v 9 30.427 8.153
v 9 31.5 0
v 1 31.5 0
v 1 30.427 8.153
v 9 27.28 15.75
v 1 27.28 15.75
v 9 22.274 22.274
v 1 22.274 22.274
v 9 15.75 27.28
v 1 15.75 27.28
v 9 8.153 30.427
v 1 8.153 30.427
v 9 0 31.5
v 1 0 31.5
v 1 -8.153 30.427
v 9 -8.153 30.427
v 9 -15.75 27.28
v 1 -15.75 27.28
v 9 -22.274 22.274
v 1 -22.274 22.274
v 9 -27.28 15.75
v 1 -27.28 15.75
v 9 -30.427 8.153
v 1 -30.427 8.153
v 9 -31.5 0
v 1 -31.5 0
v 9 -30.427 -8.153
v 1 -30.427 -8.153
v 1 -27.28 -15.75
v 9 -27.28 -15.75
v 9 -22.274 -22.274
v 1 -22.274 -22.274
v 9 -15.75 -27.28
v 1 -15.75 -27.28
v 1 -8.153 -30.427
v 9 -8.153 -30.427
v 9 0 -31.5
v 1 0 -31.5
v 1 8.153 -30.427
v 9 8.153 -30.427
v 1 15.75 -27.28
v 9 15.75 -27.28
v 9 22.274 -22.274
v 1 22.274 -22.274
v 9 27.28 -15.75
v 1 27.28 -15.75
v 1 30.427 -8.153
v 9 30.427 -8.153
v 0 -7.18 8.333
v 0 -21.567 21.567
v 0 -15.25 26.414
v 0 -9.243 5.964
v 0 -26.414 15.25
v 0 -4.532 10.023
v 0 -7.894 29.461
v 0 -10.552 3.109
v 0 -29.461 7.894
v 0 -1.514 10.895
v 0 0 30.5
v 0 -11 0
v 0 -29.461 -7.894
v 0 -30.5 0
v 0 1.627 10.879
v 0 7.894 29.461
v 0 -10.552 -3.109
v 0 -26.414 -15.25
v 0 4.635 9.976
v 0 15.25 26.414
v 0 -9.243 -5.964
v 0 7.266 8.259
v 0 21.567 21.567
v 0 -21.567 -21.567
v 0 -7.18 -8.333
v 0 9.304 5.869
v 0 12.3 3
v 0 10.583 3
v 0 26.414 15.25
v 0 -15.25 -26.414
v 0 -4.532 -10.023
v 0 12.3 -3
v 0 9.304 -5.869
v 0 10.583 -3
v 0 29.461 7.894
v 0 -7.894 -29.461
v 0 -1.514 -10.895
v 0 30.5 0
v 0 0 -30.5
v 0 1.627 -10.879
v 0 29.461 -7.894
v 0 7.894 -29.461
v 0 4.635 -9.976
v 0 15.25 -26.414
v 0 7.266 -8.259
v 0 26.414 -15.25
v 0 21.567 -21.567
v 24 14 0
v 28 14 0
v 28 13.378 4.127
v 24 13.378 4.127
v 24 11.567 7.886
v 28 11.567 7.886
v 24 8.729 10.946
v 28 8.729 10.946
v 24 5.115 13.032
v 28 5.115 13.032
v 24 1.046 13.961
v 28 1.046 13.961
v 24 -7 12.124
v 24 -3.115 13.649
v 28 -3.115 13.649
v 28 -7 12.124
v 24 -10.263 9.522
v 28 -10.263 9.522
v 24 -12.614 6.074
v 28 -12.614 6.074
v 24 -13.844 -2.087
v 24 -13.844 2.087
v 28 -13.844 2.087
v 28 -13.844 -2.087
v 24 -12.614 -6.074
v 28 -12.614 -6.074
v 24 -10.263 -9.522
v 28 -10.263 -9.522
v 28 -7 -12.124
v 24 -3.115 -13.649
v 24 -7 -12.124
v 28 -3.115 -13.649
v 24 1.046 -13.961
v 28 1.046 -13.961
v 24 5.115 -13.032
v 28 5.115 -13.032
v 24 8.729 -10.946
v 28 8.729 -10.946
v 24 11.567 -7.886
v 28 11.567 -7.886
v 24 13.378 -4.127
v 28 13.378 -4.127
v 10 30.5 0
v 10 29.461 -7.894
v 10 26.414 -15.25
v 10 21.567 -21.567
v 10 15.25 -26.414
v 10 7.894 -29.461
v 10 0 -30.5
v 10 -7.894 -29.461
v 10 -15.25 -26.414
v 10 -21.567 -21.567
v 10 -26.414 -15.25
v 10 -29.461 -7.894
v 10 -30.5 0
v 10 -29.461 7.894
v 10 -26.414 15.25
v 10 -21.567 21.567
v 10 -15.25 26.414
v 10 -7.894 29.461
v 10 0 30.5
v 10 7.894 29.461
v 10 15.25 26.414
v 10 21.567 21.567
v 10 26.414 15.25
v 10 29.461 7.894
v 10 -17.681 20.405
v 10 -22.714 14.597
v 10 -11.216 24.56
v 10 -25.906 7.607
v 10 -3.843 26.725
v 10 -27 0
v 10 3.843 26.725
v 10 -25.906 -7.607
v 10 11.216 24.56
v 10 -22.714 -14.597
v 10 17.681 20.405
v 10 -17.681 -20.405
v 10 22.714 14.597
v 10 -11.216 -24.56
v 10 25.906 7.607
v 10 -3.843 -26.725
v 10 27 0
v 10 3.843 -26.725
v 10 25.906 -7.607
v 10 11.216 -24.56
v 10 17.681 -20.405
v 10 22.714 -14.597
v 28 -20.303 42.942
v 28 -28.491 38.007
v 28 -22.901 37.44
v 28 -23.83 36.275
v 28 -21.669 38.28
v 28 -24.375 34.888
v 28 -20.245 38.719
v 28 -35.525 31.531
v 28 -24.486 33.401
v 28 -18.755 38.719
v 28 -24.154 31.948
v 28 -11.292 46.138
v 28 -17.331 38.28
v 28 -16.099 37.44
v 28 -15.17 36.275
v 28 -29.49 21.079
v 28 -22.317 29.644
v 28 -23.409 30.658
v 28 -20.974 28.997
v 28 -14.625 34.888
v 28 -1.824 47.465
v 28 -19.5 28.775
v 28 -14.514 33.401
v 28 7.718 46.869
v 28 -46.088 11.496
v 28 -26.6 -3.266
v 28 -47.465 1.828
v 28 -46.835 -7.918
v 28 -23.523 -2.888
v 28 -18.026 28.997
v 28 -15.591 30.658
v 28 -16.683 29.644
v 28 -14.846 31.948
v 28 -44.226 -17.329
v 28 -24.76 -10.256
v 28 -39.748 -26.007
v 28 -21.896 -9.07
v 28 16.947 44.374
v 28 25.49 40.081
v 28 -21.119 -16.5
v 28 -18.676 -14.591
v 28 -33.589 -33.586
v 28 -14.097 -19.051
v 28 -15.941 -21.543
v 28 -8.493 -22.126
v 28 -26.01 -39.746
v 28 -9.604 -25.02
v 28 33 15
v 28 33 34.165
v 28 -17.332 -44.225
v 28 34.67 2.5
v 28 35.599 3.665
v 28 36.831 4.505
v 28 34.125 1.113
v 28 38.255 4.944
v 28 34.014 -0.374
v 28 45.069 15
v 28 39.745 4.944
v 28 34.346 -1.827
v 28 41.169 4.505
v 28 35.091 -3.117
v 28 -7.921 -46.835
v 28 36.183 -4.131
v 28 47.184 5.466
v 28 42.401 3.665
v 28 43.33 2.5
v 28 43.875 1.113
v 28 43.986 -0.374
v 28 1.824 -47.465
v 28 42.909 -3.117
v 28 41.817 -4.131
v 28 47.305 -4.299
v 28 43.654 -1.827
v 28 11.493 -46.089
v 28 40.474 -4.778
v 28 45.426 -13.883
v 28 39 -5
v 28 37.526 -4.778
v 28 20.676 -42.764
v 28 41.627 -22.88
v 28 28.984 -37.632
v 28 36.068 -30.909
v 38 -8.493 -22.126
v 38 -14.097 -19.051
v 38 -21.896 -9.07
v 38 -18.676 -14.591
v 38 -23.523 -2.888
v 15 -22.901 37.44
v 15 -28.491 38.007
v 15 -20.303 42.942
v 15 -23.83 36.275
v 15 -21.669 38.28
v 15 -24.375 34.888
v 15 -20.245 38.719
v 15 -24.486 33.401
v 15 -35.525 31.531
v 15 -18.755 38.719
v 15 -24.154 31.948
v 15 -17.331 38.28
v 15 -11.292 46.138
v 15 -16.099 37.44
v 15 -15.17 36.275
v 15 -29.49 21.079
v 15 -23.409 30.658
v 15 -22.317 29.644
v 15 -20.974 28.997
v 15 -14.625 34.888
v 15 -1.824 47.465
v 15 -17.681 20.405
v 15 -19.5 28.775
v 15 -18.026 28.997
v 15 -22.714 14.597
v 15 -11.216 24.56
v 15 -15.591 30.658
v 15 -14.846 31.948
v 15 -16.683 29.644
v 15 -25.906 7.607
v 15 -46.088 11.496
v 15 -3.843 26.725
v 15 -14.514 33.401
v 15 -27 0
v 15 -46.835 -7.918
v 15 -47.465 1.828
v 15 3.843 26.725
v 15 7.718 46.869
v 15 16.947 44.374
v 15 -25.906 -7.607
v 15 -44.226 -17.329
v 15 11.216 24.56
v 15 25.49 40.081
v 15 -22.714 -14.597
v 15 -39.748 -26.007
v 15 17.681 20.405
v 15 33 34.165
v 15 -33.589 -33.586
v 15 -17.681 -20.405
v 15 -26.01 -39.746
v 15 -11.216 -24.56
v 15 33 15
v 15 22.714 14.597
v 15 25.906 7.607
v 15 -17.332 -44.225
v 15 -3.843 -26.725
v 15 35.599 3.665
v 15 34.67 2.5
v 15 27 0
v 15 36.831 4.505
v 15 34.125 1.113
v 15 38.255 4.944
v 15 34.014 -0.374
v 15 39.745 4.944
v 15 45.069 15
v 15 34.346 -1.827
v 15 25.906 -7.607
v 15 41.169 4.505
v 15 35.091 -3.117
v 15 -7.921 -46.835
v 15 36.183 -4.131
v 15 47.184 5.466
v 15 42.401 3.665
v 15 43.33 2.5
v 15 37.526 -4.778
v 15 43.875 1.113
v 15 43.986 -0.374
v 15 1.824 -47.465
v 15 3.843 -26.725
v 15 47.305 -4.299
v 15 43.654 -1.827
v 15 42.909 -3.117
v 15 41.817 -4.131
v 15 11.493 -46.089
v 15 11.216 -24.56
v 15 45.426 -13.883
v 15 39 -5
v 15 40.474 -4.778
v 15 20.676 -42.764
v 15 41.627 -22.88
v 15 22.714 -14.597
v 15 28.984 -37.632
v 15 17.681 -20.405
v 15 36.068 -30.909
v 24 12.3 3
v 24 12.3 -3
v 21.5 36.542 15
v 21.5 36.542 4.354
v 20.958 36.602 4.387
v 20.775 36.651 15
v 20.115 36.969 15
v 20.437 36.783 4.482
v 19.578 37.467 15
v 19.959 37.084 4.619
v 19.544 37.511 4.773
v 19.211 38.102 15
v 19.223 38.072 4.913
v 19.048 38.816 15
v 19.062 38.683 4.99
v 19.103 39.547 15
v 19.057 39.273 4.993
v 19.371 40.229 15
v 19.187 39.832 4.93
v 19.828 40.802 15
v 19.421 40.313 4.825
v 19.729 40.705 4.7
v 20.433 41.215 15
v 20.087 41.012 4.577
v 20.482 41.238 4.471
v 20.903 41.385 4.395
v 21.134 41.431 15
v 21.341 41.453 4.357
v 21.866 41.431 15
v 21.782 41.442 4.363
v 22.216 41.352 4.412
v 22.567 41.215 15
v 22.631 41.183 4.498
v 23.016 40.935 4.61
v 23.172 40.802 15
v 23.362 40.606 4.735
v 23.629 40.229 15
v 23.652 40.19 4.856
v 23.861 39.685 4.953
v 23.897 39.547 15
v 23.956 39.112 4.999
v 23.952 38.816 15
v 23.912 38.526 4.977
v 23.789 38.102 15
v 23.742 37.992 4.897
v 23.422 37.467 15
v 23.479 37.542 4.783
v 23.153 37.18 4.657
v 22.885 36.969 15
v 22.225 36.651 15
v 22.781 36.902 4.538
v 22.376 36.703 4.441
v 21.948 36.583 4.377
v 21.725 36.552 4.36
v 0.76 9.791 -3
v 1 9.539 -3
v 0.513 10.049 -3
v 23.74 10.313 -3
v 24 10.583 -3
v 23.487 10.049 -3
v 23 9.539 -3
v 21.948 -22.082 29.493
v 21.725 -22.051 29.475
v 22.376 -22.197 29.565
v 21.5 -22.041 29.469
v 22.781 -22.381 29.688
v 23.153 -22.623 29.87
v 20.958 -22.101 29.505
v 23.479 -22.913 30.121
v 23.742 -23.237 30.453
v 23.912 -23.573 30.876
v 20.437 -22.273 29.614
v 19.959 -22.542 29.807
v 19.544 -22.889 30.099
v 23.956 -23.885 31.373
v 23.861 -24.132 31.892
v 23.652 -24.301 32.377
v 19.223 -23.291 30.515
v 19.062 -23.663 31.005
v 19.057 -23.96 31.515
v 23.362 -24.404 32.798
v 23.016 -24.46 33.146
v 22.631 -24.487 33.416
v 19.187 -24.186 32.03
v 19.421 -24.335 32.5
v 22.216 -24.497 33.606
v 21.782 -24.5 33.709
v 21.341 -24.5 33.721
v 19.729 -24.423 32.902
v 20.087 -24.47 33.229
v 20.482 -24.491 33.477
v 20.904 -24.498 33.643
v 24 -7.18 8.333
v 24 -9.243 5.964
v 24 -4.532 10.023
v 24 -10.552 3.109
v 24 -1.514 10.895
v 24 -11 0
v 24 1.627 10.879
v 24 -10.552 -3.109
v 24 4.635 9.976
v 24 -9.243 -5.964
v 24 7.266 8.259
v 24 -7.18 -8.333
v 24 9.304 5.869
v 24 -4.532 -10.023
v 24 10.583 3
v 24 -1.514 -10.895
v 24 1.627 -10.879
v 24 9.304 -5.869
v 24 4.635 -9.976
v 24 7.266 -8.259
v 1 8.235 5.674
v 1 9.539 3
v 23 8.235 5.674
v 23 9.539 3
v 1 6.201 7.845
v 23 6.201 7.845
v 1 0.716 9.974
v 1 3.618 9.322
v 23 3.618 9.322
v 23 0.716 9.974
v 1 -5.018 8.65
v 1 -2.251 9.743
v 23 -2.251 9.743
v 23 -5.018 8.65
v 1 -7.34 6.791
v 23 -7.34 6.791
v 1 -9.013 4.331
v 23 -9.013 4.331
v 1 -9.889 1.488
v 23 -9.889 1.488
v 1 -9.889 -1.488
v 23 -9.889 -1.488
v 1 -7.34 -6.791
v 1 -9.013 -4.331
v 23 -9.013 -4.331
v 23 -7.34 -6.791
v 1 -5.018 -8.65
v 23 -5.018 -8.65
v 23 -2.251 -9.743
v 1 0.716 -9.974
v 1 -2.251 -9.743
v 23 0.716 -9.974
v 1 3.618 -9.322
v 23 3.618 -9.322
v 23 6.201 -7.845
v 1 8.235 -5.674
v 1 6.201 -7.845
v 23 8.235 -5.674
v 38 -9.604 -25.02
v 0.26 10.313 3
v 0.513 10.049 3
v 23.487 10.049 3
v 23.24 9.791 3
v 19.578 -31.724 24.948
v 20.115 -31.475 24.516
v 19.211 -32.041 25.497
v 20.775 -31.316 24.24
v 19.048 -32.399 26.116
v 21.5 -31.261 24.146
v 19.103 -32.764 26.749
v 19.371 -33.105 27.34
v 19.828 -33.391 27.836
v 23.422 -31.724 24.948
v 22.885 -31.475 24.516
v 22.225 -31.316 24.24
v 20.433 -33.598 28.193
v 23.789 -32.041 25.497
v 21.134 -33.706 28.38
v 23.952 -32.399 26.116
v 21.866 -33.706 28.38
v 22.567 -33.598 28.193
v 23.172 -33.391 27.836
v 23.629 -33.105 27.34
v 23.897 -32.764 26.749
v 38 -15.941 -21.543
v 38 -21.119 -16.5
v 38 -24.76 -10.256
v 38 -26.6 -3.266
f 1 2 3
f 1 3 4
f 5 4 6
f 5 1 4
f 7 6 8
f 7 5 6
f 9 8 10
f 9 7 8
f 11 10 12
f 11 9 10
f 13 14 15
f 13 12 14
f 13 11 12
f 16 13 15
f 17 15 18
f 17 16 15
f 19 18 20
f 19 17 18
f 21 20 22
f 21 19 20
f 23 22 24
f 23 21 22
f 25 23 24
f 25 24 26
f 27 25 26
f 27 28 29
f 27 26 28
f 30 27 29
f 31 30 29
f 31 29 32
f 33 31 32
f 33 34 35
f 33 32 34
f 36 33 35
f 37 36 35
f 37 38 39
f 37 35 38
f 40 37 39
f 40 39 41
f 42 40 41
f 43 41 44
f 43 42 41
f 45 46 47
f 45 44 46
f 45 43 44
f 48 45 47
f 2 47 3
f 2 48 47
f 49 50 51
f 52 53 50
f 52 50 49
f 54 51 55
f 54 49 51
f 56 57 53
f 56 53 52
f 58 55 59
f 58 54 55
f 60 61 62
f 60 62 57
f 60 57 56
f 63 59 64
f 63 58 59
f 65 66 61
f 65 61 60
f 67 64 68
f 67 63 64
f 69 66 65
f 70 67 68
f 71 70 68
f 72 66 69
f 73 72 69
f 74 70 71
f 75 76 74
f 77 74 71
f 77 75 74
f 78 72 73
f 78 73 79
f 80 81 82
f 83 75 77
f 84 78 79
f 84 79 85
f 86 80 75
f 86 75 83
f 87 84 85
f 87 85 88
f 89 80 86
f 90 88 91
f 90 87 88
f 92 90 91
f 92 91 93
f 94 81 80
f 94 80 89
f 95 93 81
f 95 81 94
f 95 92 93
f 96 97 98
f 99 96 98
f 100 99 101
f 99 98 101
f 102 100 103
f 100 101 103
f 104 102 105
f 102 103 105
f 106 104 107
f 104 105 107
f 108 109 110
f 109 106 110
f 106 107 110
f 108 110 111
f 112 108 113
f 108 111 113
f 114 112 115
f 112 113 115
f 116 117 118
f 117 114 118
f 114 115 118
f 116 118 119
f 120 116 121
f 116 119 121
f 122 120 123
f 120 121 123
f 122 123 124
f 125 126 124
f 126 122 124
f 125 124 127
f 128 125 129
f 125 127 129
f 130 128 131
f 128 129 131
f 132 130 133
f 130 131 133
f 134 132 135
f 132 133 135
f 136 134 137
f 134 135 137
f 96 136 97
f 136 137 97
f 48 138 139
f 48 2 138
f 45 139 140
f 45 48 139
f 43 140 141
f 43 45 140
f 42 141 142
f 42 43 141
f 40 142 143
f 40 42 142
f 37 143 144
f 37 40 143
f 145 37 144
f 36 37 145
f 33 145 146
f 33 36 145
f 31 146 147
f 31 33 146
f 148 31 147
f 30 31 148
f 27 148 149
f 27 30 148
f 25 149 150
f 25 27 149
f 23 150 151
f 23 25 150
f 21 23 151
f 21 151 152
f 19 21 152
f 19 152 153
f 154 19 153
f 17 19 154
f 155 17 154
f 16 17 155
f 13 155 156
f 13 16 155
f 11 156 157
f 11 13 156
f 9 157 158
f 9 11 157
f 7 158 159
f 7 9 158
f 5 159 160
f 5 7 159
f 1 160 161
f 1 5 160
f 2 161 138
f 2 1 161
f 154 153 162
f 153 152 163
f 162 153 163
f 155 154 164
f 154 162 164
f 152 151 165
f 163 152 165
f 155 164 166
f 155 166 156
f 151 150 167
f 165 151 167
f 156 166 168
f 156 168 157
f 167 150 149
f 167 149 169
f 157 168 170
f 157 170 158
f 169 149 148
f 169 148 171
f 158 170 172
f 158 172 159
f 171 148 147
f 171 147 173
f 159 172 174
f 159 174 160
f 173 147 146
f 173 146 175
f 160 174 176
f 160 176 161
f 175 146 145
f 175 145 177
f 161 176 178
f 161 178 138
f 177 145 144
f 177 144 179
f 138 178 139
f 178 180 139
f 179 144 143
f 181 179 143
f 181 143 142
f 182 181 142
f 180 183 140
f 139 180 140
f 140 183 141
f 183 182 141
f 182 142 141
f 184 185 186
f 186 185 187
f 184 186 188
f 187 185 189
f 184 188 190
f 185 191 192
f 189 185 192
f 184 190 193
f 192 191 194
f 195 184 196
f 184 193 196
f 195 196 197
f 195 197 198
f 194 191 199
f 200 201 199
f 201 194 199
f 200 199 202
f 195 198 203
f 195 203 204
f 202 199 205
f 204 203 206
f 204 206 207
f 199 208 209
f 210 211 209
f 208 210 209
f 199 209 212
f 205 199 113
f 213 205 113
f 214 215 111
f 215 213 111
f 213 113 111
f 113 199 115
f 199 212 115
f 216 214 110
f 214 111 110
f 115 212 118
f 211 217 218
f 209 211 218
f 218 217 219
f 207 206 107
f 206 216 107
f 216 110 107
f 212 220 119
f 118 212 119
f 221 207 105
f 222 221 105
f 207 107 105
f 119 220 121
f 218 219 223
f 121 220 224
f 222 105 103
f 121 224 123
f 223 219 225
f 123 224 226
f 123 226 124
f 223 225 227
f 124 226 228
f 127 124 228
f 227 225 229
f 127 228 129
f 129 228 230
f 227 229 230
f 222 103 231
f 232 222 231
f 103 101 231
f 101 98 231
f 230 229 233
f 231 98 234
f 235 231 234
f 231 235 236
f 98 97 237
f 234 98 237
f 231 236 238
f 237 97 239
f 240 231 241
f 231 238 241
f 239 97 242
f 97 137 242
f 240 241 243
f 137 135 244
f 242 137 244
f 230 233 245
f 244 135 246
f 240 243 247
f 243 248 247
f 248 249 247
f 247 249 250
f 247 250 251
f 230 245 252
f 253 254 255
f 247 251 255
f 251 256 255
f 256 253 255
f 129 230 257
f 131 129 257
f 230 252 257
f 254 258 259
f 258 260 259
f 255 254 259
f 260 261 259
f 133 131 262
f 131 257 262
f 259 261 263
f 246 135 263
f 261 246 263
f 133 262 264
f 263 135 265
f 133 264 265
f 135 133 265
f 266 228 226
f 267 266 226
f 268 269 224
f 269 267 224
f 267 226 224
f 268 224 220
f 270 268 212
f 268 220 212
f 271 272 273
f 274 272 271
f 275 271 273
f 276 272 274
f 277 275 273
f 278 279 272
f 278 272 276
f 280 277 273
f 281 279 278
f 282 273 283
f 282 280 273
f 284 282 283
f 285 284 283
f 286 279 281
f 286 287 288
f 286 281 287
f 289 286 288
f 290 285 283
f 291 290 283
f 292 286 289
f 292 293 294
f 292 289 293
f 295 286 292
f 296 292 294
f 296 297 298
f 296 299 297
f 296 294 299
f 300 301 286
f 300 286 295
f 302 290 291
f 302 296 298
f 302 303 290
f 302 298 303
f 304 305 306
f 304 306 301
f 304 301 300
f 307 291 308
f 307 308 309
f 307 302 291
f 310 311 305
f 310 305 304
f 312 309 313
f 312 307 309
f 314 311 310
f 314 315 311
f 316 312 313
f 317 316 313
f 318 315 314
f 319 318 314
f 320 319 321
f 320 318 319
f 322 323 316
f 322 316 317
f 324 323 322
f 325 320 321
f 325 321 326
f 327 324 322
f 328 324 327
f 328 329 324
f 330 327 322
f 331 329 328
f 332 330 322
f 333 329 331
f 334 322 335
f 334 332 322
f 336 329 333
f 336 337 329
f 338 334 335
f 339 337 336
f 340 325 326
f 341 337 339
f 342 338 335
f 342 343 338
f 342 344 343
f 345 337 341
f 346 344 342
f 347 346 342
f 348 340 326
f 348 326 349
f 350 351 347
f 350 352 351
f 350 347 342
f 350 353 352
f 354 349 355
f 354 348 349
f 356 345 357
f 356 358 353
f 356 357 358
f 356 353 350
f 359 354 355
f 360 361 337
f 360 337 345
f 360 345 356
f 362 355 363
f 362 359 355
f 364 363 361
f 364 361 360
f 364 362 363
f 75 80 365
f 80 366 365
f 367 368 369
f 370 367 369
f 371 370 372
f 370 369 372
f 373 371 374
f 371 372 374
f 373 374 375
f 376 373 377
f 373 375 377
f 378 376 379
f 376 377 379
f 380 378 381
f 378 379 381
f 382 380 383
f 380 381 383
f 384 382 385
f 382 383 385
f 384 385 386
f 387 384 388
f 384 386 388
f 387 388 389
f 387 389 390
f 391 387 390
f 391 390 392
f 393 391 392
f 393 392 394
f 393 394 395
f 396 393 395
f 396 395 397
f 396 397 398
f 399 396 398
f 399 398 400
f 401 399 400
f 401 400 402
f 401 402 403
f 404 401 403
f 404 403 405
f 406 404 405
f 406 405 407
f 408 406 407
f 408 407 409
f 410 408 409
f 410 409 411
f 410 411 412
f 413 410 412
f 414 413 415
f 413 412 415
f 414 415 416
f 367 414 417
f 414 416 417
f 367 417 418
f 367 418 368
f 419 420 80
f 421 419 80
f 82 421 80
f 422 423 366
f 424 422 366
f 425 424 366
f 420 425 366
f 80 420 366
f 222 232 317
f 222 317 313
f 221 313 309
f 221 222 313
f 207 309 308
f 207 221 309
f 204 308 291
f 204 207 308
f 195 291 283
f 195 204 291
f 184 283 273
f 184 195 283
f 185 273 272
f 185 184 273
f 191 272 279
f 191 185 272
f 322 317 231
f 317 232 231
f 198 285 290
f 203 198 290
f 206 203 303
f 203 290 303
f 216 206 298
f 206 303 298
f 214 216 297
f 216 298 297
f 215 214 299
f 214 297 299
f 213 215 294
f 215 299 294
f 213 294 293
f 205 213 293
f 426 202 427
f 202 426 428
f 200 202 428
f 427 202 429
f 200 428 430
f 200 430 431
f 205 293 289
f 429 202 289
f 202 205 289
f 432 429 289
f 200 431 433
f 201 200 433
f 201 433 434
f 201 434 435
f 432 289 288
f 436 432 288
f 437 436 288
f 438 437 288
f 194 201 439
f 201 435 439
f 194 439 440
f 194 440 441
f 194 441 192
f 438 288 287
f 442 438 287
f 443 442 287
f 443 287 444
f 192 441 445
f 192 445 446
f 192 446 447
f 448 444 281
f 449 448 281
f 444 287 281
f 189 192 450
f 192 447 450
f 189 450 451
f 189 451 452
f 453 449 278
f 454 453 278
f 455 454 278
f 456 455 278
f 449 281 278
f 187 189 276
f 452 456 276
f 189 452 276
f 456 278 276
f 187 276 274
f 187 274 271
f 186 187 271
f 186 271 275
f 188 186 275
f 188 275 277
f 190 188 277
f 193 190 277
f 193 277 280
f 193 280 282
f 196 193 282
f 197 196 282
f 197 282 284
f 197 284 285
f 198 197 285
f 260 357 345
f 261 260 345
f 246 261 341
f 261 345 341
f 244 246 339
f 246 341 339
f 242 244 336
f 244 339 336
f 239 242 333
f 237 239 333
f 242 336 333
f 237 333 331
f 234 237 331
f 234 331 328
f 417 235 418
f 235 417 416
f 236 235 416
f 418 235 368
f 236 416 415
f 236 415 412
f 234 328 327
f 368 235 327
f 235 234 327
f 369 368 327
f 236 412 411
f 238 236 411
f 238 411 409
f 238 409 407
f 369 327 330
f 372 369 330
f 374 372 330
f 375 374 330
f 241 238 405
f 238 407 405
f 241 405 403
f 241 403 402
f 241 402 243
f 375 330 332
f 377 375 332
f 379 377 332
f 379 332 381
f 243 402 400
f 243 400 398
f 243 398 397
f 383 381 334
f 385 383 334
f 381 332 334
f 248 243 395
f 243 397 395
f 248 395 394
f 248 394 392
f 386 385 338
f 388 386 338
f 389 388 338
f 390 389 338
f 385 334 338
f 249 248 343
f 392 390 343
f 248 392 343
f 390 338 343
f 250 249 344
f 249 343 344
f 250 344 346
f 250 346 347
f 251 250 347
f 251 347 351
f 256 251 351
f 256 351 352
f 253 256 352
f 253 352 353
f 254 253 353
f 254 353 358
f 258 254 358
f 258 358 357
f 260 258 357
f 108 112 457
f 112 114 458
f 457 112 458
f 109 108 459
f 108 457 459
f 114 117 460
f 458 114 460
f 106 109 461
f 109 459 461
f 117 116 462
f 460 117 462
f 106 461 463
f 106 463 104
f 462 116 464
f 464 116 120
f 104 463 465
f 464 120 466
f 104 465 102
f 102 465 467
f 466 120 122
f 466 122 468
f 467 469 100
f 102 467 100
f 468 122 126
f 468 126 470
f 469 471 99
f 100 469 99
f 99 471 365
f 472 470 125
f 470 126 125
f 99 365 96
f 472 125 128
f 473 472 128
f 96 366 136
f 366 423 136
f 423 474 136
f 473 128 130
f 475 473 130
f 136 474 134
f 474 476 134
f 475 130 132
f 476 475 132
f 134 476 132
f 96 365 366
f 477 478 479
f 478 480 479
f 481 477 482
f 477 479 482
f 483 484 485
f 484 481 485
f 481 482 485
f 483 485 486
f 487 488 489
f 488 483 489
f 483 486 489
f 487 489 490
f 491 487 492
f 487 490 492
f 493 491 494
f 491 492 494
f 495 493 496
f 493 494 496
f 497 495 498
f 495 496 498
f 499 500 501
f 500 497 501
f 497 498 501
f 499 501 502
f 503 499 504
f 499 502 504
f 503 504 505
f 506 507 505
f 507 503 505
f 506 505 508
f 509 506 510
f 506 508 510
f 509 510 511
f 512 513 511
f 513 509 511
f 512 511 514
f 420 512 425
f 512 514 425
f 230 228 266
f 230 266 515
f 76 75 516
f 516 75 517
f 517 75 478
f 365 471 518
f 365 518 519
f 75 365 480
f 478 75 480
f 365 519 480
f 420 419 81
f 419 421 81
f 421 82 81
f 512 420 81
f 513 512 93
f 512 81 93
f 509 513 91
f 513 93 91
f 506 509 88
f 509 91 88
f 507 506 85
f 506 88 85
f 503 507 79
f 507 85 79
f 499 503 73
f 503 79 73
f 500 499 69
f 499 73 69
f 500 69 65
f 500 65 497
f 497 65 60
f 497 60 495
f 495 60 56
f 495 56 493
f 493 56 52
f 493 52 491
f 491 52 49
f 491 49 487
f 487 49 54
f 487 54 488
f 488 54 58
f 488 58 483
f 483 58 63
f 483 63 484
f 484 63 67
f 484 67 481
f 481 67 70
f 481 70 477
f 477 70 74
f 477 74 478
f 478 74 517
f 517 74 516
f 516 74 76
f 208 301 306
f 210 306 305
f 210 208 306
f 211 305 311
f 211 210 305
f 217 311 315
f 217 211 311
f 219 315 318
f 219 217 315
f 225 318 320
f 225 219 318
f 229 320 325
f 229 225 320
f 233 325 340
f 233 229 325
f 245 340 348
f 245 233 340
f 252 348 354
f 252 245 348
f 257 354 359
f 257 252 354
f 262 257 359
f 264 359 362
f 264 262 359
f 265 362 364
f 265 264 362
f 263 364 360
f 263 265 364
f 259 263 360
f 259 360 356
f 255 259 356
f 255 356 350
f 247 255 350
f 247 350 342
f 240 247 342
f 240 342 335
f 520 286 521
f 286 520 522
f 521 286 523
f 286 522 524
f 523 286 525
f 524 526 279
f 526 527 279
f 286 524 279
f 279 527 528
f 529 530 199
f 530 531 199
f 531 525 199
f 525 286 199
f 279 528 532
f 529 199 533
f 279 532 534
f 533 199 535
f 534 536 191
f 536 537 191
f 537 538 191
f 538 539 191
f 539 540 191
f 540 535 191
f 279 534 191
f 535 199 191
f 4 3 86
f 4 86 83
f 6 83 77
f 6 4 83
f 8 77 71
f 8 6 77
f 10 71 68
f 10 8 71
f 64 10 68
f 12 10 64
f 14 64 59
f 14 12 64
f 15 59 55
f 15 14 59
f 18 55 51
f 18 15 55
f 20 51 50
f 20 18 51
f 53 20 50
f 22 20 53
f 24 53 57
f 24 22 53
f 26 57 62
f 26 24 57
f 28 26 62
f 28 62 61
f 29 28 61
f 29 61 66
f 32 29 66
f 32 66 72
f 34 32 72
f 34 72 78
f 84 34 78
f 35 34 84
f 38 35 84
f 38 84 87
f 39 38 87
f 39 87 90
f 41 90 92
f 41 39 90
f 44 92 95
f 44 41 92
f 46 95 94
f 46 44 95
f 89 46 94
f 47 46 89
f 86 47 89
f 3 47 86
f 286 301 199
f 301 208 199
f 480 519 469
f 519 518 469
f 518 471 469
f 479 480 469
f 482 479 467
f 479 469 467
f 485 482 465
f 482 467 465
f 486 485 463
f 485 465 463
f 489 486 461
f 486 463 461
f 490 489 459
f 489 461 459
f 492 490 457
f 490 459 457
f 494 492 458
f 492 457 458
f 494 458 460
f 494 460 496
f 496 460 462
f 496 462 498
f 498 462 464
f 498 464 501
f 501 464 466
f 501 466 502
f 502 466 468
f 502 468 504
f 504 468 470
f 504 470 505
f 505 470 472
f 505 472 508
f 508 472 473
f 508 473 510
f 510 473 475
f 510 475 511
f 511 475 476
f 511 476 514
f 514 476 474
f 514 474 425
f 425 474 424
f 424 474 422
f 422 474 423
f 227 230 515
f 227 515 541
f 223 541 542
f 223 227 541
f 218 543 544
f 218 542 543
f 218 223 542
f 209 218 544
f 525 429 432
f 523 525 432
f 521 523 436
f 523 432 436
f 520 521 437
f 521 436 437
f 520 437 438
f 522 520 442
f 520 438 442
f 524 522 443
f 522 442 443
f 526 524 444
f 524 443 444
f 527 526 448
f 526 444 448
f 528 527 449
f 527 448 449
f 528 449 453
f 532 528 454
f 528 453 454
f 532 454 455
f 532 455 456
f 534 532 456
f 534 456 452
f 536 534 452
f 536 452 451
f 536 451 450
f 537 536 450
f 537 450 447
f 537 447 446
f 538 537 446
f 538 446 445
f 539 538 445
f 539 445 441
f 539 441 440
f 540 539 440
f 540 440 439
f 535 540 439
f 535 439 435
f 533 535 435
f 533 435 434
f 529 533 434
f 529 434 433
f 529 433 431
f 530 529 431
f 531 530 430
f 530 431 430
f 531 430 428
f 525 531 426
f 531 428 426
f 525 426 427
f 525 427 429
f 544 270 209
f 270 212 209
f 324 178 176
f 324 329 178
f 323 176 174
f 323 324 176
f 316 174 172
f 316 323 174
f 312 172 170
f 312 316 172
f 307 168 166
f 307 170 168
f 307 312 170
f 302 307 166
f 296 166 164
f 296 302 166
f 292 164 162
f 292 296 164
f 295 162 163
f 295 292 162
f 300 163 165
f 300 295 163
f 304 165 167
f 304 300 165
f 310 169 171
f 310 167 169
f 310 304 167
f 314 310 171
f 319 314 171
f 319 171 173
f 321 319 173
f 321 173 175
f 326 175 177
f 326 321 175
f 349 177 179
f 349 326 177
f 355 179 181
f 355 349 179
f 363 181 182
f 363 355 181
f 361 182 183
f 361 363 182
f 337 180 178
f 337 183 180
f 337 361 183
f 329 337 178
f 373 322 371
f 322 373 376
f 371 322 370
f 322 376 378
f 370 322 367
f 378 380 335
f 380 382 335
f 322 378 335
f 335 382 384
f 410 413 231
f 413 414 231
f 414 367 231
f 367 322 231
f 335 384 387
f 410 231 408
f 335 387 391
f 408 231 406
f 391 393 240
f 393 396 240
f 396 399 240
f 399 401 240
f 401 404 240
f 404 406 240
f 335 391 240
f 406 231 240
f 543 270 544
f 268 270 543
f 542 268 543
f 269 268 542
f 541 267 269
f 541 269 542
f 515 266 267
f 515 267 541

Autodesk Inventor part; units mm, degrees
ref_plane "YZ Plane" through (0, 0, 0) normal (1, 0, 0) x (0, 1, 0)
ref_plane "XZ Plane" through (0, 0, 0) normal (0, 1, 0) x (-1, 0, 0)
ref_plane "XY Plane" through (0, 0, 0) normal (0, 0, 1) x (1, 0, 0)
sketch "Sketch1" plane through (0, 0, 0) normal (0, 0, 1) x (1, 0, 0)
  line L0 (0, 0) -> (0, 10) construction
  line L1 (0, 31.5) -> (10, 31.5)
  line L2 (10, 31.5) -> (10, 27)
  line L3 (10, 27) -> (15, 27)
  line L4 (15, 27) -> (15, 47.5)
  line L5 (15, 47.5) -> (28, 47.5)
  line L6 (28, 47.5) -> (28, 14)
  line L7 (28, 0) -> (0, 0)
  line L8 (0, 10) -> (24, 10)
  line L9 (24, 10) -> (24, 14)
  line L10 (24, 14) -> (28, 14)
  line L11 (0, 10) -> (0, 31.5)
  line L12 (28, 14) -> (28, 0) construction
  dimension "d0" = 95
  dimension "d1" = 54
  dimension "d2" = 63
  dimension "d3" = 20
  dimension "d4" = 28
  dimension "d5" = 4
  dimension "d6" = 28
  dimension "d7" = 13
  dimension "d8" = 10
revolve "Revolution1" add sketch "Sketch1" angle 360 about axis through (28, 0, 0) along (-1, 0, 0)
chamfer "Chamfer1" distance 1 angle 45 4 edges at (24, -10, 0) (0, -10, 0) (10, -31.5, 0) (0, -31.5, 0)
sketch "Sketch2" plane through (28, 0, 0) normal (1, 0, 0) x (0, 0, -1)
  circle A0 centre (0, 0) radius 47.5 projected
  circle A1 centre (0, 0) radius 14 projected
  arc A2 (3.2661, -26.6002) -> (25.02, -9.6043) centre (0, 0) ccw
  arc A3 (2.8883, -23.5233) -> (22.1259, -8.4933) centre (0, 0) ccw
  line L0 (2.8883, -23.5233) -> (3.2661, -26.6002)
  line L1 (22.1259, -8.4933) -> (25.02, -9.6043)
  line L2 (0, 0) -> (0, -47.5)
  dimension "d13" = 7
  dimension "d14" = 62
  dimension "d15" = 23.7
  dimension "d16" = 26.8
extrude "Extrusion1" add sketch "Sketch2" along normal blind 10 contours L0 A3 L1 A2
sketch "Sketch3" plane through (28, 0, 0) normal (1, 0, 0) x (0, 0, -1)
  arc A0 (2.8883, -23.5233) -> (22.1259, -8.4933) centre (0, 0) ccw projected
  circle A1 centre (0, 0) radius 47.5 projected
  line L0 (-34.165, 33) -> (-15, 33)
  line L1 (-15, 33) -> (-15, 45.0694)
  dimension "d19" = 33
  dimension "d20" = 15
extrude "Extrusion2" cut sketch "Sketch3" against normal through all contours L1 L0 A1 picked at (-25.8726, 34.6785)
sketch "Sketch4" plane through (28, 33, 15) normal (1, 0, 0) x (0, 0, -1)
  circle A0 centre (15, -33) radius 14 projected
  line L0 (0, 0) -> (-19.165, 0) projected
  point P0 (15, 6)
  dimension "d23" = 6
hole "Hole1" at (28, 39, 0) direction (-1, 0, 0) diameter 10 end through all
sketch "Sketch5" plane through (28, 33, 15) normal (0, 0, 1) x (1, 0, 0)
  line L0 (0, 0) -> (-13, 0) projected
  line L1 (-13, 12.0694) -> (0, 12.0694) projected
  point P0 (-28, -33)
  point P1 (-6.5, 6)
  point P2 (-6.5, 12.0694)
  dimension "d31" = 6
hole "Hole2" at (21.5, 39, 15) direction (0, 0, -1) diameter 4.917 end up to surface thread size "M6x1" class "6H" standard "ISO Metric profile"
pattern_circular "Circular Pattern1" count 2 over 120 about axis through (21.5, 0, 0) along (1, 0, 0) of "Hole2", "Hole1", "Extrusion2"
sketch "Sketch6" plane through (24, 0, 0) normal (1, 0, 0) x (0, 0, -1)
  circle A0 centre (0, 0) radius 14 projected
  line L0 (-3, 0) -> (3, 0)
  line L1 (3, 0) -> (3, 12.3)
  line L2 (3, 12.3) -> (-3, 12.3)
  line L3 (-3, 12.3) -> (-3, 0)
  dimension "d42" = 12.3
  dimension "d43" = 6
extrude "Extrusion3" cut sketch "Sketch6" against normal through all contours L3 L2 L1 L0
properties part number "Part032.Front support" material "Steel, Cast"
